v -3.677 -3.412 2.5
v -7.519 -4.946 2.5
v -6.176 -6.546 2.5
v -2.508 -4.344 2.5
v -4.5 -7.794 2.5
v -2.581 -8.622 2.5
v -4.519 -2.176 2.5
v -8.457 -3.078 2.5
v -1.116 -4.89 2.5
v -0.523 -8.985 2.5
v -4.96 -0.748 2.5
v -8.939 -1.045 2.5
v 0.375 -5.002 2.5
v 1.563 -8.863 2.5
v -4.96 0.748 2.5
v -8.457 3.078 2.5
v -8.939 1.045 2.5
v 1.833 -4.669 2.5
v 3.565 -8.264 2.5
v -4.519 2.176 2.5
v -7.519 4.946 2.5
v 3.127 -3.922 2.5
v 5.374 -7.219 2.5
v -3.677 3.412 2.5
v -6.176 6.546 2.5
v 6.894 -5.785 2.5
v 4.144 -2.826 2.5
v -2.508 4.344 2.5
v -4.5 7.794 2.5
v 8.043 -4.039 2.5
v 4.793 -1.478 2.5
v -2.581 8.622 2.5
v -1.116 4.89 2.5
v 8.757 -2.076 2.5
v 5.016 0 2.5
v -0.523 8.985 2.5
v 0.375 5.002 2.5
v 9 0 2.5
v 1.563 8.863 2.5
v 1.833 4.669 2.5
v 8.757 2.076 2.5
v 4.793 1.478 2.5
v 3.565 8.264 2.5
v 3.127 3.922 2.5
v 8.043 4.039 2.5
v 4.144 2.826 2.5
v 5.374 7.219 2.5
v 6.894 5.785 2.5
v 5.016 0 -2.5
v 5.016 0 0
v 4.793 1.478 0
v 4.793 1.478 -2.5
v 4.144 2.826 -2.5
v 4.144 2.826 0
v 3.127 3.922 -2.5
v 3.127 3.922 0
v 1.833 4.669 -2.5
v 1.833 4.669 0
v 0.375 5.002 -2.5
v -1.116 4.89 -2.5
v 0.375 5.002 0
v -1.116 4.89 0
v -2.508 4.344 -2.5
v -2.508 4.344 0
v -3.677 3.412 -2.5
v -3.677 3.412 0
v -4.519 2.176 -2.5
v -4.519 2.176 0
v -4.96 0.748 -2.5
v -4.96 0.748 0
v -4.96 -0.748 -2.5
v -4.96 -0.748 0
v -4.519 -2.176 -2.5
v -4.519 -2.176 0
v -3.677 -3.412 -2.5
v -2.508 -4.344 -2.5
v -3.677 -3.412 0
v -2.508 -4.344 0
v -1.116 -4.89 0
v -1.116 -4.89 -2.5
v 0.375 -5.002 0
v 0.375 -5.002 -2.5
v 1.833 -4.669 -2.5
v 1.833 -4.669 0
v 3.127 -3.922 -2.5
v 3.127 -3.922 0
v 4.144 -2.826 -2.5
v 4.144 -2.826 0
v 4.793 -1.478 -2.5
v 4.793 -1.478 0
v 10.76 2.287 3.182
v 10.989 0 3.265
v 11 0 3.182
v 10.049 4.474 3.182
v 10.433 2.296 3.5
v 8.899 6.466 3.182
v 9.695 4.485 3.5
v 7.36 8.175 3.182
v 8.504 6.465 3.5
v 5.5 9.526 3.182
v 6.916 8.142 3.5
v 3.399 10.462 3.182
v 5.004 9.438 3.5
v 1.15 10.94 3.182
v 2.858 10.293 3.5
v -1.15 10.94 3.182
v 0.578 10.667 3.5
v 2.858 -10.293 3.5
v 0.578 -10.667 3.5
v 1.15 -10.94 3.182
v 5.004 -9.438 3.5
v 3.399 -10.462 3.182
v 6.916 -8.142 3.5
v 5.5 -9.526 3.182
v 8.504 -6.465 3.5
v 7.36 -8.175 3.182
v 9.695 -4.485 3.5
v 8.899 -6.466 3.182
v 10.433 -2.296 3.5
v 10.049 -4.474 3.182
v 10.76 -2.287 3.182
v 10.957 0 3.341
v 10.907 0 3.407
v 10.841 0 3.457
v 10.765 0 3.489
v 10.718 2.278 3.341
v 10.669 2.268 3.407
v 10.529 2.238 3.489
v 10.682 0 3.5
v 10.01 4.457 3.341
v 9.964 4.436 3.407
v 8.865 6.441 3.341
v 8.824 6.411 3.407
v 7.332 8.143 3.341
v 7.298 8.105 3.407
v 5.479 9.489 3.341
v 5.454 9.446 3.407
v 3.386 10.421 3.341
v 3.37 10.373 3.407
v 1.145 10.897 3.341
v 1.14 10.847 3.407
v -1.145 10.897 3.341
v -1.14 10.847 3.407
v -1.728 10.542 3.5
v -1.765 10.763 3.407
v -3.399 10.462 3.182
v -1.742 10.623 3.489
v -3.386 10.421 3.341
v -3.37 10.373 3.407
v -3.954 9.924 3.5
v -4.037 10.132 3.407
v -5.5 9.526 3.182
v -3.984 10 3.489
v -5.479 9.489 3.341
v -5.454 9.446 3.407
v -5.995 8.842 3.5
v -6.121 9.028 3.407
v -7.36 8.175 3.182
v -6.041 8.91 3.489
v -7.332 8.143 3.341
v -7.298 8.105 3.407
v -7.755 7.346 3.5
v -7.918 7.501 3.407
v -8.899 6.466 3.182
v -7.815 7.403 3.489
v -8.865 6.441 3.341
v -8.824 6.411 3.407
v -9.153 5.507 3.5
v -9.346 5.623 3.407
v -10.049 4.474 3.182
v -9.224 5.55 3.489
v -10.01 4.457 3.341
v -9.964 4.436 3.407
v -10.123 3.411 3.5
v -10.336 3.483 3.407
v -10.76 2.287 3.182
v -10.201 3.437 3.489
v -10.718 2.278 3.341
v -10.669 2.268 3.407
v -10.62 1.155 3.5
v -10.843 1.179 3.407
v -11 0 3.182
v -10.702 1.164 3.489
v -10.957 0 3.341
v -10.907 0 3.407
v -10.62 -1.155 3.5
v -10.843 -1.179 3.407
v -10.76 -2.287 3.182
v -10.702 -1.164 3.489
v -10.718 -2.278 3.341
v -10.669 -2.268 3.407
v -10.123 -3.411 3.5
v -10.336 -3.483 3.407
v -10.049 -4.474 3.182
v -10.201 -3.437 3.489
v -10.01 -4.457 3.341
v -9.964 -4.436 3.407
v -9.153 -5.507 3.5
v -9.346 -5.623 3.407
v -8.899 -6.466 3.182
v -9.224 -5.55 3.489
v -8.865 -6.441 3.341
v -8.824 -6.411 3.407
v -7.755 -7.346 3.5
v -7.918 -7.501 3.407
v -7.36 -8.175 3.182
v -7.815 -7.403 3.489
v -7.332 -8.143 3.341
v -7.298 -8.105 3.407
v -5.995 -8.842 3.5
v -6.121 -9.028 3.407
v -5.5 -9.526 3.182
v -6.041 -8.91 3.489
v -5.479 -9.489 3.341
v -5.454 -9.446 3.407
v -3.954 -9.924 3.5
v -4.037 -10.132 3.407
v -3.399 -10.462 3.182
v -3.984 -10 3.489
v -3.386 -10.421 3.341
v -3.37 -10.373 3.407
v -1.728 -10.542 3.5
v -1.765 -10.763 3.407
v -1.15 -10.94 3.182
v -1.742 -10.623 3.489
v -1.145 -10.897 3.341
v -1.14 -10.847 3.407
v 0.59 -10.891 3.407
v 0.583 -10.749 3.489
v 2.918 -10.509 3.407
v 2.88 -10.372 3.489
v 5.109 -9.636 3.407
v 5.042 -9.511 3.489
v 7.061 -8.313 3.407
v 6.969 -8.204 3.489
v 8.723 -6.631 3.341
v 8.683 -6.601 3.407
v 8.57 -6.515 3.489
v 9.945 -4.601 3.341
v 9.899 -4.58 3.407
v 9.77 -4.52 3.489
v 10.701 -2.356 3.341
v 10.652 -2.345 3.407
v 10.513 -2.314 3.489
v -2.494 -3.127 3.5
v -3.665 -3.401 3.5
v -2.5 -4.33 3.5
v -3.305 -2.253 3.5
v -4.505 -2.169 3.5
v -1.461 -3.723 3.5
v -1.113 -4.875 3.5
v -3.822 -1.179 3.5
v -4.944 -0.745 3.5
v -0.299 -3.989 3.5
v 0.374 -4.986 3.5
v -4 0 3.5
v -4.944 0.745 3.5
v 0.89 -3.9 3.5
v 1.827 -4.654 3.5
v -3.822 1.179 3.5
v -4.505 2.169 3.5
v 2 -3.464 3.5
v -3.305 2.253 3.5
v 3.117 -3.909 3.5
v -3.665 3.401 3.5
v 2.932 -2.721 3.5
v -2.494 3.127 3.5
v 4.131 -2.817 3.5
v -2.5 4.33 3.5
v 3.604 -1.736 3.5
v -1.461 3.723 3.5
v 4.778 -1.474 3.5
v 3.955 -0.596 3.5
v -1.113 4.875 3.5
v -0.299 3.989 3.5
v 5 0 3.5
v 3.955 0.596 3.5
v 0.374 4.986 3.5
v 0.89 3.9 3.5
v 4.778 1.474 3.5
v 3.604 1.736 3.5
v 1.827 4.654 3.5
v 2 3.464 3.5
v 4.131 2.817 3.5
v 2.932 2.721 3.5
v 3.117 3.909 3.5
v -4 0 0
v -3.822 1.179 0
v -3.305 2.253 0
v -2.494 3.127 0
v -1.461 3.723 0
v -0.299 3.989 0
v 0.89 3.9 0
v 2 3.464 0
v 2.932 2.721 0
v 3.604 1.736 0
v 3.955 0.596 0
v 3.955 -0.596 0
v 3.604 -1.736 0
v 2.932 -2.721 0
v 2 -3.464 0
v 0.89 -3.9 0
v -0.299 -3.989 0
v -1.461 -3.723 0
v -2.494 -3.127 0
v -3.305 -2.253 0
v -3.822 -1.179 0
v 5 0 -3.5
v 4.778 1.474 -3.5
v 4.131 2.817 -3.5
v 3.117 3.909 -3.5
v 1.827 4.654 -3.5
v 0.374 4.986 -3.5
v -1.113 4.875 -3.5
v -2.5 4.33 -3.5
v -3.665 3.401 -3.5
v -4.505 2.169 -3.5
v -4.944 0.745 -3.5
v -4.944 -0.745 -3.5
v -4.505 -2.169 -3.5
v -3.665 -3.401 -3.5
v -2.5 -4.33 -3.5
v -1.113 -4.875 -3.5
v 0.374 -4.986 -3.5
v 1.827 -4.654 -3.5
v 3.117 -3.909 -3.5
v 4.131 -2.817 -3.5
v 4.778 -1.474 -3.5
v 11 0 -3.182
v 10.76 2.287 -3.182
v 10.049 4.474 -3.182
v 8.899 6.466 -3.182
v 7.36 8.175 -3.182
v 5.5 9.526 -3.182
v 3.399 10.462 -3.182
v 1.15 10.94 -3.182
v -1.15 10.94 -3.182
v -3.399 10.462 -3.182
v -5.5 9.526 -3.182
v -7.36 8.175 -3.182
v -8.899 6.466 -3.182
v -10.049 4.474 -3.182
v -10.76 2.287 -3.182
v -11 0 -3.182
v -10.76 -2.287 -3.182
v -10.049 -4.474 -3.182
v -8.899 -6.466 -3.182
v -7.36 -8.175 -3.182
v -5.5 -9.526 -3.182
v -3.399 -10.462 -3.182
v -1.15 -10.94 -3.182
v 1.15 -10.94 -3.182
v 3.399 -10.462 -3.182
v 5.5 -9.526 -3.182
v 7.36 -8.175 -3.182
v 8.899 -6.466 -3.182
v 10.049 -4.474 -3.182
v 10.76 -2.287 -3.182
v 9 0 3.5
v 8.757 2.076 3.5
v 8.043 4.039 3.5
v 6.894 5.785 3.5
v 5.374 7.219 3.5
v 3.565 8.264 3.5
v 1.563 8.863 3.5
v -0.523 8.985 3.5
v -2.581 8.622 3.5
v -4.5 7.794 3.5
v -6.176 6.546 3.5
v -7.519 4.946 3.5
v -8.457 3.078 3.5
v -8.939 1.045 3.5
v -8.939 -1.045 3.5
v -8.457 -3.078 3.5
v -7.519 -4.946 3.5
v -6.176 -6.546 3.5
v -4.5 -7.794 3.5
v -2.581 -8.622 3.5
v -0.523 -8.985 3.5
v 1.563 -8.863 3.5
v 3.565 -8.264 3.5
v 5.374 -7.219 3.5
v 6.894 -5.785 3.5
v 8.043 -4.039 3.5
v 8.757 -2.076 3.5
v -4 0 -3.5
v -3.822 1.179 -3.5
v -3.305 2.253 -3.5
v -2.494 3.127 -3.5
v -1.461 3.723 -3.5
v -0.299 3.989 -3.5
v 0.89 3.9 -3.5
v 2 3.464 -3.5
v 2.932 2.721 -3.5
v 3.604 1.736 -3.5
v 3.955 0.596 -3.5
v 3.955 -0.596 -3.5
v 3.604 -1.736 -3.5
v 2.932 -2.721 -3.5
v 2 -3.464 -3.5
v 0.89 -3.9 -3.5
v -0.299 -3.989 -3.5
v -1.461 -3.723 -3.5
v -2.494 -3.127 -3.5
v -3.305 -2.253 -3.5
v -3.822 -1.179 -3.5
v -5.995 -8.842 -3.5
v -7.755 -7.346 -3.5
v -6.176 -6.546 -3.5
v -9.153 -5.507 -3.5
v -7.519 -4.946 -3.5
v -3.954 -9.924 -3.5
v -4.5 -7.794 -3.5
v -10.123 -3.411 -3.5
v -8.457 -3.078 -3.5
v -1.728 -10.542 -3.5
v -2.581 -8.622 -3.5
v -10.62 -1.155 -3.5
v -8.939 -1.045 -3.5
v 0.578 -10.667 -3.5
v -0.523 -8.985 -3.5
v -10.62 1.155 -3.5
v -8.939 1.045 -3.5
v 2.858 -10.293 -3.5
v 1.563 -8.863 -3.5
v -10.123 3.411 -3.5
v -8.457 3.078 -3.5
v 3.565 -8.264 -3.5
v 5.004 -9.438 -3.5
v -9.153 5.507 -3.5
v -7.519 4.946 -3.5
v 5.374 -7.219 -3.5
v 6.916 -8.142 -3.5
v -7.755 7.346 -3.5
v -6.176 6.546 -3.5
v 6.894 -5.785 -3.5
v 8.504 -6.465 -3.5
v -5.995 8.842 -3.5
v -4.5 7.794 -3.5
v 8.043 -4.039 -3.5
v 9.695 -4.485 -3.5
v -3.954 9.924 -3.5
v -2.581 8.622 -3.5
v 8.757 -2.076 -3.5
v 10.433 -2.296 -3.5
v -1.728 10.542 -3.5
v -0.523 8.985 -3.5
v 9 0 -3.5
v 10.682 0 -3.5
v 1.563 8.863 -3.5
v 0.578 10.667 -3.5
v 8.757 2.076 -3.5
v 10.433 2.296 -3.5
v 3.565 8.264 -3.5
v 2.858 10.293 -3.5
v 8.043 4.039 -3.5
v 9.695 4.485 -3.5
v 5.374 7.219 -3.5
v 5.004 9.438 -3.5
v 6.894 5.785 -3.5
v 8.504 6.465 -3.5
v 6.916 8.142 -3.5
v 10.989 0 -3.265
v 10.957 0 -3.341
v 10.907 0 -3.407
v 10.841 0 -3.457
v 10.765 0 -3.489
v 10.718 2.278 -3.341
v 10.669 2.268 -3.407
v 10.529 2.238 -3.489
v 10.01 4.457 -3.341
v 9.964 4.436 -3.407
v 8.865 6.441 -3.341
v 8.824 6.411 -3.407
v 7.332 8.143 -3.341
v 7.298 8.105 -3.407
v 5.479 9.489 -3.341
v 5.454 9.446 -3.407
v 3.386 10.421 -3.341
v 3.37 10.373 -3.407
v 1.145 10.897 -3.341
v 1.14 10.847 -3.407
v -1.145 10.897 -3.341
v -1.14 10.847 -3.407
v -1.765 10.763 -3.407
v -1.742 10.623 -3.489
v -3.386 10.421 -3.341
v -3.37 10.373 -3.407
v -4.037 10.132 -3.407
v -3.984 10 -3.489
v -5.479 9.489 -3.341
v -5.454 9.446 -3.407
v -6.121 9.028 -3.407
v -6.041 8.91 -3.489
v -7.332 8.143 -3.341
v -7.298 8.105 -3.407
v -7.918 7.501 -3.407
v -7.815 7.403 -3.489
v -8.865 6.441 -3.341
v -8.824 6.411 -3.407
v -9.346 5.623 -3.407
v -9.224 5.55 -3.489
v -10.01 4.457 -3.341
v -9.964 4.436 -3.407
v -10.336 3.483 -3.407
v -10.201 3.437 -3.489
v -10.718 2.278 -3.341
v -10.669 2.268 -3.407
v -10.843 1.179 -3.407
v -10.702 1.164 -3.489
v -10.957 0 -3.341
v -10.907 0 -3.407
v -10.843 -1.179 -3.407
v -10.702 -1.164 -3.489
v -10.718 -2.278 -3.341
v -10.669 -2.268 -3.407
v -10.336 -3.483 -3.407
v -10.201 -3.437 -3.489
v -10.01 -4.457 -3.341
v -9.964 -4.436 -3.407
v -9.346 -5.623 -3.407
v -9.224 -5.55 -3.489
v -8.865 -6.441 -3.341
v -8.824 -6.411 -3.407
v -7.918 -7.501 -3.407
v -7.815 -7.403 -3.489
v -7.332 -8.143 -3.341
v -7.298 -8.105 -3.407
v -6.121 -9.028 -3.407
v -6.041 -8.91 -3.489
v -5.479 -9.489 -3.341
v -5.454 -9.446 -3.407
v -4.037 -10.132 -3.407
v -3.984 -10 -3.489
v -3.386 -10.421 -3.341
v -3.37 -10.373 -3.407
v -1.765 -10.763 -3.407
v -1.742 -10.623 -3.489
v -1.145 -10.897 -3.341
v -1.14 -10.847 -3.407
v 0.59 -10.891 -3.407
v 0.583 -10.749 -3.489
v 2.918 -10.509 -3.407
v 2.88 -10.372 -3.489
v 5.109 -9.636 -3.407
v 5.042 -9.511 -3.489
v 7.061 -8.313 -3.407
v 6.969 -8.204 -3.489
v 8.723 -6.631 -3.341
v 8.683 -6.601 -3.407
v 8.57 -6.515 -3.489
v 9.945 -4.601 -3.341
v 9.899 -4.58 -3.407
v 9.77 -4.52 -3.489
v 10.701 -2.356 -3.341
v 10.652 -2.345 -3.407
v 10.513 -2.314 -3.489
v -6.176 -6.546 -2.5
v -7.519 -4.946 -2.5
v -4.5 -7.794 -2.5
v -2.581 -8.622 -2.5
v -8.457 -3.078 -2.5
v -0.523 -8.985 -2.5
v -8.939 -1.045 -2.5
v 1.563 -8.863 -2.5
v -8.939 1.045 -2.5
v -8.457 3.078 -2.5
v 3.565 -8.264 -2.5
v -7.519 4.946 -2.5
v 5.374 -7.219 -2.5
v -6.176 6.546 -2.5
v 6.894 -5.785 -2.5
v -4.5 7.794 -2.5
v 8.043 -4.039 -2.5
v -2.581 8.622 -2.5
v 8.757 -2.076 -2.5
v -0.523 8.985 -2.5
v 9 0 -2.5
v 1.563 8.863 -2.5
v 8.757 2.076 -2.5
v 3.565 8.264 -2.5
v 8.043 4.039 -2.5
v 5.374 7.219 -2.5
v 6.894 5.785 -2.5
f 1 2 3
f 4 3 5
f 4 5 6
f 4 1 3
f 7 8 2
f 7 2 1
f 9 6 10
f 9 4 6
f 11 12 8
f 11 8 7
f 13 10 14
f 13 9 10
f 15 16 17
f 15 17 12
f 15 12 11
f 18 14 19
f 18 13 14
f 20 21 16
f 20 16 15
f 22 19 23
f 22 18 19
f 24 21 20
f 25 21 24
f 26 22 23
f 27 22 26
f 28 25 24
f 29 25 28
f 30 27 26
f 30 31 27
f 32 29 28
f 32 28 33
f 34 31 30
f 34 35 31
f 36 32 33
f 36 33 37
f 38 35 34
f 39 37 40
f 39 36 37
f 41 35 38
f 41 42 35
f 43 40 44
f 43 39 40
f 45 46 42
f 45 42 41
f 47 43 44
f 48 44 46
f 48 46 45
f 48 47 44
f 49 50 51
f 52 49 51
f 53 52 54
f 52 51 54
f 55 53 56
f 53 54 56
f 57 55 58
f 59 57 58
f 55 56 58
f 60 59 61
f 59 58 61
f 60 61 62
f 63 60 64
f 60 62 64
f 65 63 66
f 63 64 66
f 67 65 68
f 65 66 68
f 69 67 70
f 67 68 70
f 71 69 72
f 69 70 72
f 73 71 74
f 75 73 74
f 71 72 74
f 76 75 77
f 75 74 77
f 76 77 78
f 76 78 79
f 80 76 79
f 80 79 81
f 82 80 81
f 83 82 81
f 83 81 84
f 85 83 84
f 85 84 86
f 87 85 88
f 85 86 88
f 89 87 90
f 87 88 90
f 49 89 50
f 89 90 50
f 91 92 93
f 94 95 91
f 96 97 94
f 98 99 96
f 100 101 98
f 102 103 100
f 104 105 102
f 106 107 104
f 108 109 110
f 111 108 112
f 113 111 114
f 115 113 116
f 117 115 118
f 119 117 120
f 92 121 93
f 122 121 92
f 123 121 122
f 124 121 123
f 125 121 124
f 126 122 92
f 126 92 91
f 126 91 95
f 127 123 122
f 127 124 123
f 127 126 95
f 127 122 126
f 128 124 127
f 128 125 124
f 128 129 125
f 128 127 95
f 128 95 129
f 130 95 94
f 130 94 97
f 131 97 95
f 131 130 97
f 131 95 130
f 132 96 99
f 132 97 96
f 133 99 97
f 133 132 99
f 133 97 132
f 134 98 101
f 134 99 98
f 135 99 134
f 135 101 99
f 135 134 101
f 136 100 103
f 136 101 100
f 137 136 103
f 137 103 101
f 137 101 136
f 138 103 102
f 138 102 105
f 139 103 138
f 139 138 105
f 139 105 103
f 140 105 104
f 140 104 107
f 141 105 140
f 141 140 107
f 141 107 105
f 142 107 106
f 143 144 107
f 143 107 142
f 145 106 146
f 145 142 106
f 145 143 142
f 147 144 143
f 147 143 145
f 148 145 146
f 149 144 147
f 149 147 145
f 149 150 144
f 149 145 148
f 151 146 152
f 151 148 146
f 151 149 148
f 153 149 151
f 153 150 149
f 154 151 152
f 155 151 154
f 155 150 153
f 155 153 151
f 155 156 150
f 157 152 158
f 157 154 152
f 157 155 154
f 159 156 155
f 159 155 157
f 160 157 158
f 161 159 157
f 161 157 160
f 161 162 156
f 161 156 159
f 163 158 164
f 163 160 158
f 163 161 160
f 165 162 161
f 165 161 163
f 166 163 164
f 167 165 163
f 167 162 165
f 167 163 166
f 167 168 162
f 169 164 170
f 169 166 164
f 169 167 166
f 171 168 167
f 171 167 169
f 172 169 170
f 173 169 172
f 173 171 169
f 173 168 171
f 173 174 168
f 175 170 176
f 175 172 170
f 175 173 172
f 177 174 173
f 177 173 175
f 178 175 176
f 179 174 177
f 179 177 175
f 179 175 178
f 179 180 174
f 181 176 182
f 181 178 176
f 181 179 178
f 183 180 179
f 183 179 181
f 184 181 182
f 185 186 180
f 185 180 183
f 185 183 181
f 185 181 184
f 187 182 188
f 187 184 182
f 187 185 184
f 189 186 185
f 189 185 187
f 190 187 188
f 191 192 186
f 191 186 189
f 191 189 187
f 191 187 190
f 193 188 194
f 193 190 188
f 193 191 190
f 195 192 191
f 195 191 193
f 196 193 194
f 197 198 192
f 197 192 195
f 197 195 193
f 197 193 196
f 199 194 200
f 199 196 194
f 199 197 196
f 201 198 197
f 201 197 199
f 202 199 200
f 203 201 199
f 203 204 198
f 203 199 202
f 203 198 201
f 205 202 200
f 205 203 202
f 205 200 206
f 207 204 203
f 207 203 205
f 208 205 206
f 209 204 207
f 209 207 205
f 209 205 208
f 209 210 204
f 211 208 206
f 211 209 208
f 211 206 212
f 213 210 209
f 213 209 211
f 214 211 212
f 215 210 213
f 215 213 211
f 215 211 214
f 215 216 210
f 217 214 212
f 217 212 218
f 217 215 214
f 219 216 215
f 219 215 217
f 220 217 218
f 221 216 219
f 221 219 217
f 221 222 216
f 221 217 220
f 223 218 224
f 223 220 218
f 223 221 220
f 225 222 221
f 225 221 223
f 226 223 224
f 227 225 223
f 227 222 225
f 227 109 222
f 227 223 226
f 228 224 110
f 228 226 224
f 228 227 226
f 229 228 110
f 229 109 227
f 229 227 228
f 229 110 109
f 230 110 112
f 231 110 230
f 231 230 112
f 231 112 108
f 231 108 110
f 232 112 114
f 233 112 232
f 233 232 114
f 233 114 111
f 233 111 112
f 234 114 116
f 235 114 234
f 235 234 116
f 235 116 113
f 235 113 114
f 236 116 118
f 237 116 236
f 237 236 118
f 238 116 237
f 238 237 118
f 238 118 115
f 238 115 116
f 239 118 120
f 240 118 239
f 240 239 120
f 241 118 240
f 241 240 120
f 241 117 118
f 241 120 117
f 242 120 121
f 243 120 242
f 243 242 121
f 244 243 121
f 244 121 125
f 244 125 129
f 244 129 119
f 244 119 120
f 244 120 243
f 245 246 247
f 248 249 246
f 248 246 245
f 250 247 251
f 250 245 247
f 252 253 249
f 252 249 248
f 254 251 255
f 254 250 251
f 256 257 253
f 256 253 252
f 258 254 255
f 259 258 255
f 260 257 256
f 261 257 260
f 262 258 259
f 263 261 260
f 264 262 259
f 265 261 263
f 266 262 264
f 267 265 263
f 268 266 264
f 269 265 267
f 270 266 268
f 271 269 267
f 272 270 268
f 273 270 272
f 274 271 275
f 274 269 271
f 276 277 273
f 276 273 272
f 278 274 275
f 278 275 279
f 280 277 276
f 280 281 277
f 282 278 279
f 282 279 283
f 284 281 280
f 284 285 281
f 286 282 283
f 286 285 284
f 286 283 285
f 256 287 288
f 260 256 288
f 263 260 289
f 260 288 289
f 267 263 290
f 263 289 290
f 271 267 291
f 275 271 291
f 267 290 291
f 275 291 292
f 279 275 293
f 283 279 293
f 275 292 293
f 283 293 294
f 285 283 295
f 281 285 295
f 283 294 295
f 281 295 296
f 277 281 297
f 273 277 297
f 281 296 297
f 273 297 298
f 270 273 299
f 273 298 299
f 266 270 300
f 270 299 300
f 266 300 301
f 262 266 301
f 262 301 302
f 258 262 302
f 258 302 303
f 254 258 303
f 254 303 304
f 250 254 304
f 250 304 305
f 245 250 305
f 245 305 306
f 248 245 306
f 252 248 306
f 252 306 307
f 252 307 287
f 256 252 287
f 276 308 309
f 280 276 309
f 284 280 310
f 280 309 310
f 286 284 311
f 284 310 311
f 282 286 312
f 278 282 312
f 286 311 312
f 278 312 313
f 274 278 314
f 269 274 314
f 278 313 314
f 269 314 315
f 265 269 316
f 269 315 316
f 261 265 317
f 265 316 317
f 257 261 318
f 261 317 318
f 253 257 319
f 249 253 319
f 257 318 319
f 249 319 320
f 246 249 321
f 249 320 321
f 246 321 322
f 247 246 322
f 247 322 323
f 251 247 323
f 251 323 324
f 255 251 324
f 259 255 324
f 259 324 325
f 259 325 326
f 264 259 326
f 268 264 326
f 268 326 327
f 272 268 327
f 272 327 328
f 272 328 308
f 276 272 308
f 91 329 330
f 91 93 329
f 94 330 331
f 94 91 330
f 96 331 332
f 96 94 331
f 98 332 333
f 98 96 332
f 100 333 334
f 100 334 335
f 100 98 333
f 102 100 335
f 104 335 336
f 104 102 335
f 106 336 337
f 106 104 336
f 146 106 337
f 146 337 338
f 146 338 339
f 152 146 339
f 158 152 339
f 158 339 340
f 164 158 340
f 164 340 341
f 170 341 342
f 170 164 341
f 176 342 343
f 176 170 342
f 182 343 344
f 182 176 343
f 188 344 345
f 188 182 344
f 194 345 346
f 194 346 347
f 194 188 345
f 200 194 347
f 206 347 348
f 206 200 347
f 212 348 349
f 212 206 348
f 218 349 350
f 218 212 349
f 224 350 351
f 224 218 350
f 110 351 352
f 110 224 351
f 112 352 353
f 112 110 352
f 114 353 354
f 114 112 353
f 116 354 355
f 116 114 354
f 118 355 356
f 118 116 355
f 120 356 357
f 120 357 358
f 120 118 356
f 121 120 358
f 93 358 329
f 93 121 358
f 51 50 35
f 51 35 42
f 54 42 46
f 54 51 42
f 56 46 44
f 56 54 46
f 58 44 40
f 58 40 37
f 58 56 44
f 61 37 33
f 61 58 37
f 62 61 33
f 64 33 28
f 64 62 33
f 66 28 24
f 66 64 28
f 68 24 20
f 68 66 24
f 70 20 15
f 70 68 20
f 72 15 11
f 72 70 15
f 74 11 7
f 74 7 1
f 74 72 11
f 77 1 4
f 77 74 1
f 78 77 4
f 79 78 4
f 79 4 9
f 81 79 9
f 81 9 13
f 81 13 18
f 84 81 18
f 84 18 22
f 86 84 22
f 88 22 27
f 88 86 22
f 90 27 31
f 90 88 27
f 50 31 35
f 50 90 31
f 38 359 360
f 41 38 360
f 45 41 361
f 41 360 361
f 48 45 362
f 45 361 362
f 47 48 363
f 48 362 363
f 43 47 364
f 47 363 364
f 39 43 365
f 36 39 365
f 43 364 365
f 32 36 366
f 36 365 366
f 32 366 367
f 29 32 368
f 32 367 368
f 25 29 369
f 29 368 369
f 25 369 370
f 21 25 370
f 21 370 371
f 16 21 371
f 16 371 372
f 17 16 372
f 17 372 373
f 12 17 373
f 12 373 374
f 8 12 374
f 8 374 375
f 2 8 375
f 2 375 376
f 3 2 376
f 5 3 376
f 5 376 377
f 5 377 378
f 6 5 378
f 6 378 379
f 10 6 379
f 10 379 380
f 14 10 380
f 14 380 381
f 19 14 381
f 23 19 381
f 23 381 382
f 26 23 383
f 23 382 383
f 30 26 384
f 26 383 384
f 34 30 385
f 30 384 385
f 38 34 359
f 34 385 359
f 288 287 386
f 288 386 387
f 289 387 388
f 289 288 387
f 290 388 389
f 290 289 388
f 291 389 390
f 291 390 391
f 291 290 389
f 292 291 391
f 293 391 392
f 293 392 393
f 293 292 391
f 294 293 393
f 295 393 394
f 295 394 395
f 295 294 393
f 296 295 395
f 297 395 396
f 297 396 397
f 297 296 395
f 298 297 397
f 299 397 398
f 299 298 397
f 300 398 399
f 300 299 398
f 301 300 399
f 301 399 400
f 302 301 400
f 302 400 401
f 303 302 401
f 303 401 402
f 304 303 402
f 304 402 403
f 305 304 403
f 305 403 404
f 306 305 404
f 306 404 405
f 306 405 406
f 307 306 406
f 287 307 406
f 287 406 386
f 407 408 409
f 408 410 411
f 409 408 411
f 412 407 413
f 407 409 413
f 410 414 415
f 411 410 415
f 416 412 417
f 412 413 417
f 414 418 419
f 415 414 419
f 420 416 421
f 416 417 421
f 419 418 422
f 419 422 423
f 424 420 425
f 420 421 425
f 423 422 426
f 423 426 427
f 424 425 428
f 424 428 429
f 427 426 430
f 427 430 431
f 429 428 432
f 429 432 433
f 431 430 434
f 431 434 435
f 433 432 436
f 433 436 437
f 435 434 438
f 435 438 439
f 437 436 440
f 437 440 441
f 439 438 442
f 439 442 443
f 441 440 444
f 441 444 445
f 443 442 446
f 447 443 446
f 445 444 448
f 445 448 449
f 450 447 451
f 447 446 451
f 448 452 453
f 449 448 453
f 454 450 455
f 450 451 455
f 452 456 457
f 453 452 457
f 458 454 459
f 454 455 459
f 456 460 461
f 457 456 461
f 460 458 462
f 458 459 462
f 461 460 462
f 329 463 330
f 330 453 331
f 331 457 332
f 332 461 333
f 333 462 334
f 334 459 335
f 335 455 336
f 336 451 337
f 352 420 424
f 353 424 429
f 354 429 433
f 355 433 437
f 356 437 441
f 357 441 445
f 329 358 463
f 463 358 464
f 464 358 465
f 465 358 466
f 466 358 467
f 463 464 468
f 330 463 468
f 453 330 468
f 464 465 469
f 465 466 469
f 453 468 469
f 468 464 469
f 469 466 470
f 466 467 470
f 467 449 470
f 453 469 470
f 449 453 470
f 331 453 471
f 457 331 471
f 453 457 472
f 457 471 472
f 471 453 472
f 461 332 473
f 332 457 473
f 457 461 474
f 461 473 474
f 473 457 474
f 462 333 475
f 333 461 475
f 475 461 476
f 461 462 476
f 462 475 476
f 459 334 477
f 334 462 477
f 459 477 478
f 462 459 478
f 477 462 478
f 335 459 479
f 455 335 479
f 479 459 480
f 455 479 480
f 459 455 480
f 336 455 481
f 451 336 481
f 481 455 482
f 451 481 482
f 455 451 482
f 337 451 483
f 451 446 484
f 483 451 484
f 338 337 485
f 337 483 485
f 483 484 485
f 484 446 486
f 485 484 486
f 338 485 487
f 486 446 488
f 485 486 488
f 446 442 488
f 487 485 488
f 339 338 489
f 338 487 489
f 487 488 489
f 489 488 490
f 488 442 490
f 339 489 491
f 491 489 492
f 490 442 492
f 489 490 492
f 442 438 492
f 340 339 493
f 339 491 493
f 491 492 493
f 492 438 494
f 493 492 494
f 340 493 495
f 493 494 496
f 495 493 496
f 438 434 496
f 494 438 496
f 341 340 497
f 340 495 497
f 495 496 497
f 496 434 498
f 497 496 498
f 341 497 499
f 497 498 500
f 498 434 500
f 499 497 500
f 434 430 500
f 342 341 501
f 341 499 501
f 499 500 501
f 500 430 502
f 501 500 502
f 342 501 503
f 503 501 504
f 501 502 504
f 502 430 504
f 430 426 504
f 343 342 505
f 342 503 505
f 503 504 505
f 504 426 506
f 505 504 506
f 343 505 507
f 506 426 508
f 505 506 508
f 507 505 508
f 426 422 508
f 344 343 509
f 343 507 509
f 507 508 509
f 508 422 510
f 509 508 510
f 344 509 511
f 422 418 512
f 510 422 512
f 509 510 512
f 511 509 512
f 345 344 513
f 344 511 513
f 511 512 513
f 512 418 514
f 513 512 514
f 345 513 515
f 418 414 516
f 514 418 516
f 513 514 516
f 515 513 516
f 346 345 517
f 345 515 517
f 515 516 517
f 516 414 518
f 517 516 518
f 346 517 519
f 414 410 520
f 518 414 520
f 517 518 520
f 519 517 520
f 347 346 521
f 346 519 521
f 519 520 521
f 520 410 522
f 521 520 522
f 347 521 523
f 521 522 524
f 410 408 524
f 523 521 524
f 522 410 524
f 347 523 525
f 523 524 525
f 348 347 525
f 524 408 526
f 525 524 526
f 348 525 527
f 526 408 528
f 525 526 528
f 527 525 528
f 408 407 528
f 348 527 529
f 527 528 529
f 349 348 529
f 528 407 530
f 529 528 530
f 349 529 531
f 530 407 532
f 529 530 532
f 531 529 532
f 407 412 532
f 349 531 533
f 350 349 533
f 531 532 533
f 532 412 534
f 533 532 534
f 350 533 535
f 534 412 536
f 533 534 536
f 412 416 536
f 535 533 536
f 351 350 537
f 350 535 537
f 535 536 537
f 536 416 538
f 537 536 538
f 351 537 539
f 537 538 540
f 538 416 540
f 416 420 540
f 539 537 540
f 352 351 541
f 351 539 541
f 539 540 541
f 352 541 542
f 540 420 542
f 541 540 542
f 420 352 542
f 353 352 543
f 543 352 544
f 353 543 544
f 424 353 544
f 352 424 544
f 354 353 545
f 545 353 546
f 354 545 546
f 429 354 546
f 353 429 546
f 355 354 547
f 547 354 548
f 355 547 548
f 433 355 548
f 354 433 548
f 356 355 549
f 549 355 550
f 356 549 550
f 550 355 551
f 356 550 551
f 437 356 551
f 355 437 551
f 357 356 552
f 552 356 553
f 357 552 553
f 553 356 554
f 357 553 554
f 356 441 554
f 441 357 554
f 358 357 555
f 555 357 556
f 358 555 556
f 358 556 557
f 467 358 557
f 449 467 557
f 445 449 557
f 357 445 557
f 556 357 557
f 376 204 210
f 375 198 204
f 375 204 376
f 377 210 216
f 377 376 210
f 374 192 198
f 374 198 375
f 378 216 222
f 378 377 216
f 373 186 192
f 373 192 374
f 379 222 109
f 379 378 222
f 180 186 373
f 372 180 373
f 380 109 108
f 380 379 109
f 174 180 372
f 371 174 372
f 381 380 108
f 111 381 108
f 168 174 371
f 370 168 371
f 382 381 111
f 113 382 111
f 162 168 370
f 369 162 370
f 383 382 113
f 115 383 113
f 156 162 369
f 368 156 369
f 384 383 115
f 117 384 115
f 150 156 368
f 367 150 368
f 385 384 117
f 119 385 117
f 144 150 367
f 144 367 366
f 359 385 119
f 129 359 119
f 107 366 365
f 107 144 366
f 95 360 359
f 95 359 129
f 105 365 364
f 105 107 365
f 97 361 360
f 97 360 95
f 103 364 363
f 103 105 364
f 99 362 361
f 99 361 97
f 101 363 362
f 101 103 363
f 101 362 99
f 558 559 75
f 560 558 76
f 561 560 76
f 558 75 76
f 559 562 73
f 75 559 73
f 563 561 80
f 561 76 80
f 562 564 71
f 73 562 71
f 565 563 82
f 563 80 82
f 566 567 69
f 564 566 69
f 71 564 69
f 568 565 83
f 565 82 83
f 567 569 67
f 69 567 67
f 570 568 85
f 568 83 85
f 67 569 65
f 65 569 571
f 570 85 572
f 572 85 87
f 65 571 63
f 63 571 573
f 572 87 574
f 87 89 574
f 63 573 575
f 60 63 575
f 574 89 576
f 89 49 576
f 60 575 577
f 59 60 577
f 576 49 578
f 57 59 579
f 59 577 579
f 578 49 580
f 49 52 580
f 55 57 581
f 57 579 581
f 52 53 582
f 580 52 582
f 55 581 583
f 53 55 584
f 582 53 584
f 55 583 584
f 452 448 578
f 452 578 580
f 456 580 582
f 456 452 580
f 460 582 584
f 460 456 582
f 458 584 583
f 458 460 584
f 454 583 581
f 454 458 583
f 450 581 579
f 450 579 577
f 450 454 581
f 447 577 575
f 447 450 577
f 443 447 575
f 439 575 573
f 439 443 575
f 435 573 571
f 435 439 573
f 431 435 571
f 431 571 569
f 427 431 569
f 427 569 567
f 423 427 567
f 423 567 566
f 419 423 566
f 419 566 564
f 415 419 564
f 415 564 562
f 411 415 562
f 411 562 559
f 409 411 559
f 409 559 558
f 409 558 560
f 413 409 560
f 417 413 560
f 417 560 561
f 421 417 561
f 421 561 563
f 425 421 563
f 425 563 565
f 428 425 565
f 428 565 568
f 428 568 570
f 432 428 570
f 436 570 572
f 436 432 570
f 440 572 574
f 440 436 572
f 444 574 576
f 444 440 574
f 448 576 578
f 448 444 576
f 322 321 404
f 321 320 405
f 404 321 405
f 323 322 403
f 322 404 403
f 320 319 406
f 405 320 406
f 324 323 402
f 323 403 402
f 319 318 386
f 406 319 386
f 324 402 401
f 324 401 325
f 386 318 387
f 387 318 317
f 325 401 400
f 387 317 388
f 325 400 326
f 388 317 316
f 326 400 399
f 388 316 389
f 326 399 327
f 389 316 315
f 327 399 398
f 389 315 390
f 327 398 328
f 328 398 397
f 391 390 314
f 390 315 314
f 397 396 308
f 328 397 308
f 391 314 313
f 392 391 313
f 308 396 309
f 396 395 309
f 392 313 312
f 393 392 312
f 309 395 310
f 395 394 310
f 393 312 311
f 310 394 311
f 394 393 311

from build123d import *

# Parameters (mm, degrees)
F0_R     = 11
F1_DEPTH = 3.5
F2_R     = 9
F2_R_2   = 5
F3_DEPTH = 3.5
F5_D     = 8
F6_R     = 9.04763
F6_R_2   = 5.015997
F7_DEPTH = 2.5
F8_R     = 0.3175


with BuildPart() as f1:
    # F0 (on Top) → F1 (new body)
    with BuildSketch(Plane.XY):
        Circle(F0_R)
    extrude(amount=F1_DEPTH)

    # F2 (on face) → F3 (cut, through all)
    with BuildSketch(Plane.XY.offset(3.5)):
        Circle(F2_R)
        Circle(F2_R_2, mode=Mode.SUBTRACT)
    extrude(amount=-F3_DEPTH, mode=Mode.SUBTRACT)

    # F5 (through all)
    with Locations(Plane.XY.offset(3.5)):
        with Locations((0, 0)):
            Hole(F5_D / 2)

    # F6 (on Top) → F7 (join)
    with BuildSketch(Plane.XY):
        Circle(F6_R)
        Circle(F6_R_2, mode=Mode.SUBTRACT)
    extrude(amount=F7_DEPTH)

    # F8
    f8_edges = [f1.edges().sort_by_distance(p)[0] for p in [
        (-11, 0, 3.5),
    ]]
    fillet(f8_edges, radius=F8_R)

    # F9: F1 across plane


with BuildPart() as f1_1:
    add(f1.part)
    add(f1.part.mirror(Plane.XY))


solid = f1_1.part
